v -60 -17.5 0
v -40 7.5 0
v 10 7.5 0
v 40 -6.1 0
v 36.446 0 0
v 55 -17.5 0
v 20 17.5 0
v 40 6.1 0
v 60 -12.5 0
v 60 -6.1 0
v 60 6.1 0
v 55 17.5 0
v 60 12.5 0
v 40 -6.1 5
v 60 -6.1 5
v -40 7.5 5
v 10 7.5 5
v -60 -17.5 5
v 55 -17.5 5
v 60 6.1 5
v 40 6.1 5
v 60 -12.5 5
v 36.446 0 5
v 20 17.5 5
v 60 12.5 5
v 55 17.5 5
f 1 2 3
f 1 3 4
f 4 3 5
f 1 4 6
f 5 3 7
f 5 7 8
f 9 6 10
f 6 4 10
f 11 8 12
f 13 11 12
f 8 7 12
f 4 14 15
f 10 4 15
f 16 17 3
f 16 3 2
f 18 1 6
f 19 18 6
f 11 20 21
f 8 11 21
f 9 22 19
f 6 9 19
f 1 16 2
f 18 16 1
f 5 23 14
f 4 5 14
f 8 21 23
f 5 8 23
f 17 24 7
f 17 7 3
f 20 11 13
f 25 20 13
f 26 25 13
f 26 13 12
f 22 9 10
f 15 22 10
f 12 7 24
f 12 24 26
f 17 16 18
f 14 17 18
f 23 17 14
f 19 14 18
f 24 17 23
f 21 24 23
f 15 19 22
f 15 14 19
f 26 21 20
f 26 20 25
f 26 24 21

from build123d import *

# Parameters (mm, degrees)
SKETCH_W        = 120
SKETCH_H        = 35
PAD_DEPTH       = 5
POCKET_DEPTH    = 5
POCKET001_DEPTH = 5


with BuildPart() as part:
    # Sketch → Pad (new body)
    with BuildSketch(Plane.XY):
        Rectangle(SKETCH_W, SKETCH_H)
    extrude(amount=PAD_DEPTH)

    # Sketch001 (on Face6 of Pad) → Pocket (cut)
    with BuildSketch(Plane.XY.offset(5)):
        Polygon((40, -6.1), (60, -6.1), (60, 6.1), (40, 6.1), (36.445622, 0), align=None)
    extrude(amount=-POCKET_DEPTH, mode=Mode.SUBTRACT)

    # Sketch002 (on Face5 of Pocket) → Pocket001 (cut)
    with BuildSketch(Plane.XY.offset(5)):
        Polygon((20, 17.5), (10, 7.5), (-40, 7.5), (-60, -17.5), (-60, 17.5), align=None)
        Polygon((60, 17.5), (60, 12.5), (55, 17.5), align=None)
        Polygon((60, -17.5), (60, -12.5), (55, -17.5), align=None)
    extrude(amount=-POCKET001_DEPTH, mode=Mode.SUBTRACT)


solid = part.part
